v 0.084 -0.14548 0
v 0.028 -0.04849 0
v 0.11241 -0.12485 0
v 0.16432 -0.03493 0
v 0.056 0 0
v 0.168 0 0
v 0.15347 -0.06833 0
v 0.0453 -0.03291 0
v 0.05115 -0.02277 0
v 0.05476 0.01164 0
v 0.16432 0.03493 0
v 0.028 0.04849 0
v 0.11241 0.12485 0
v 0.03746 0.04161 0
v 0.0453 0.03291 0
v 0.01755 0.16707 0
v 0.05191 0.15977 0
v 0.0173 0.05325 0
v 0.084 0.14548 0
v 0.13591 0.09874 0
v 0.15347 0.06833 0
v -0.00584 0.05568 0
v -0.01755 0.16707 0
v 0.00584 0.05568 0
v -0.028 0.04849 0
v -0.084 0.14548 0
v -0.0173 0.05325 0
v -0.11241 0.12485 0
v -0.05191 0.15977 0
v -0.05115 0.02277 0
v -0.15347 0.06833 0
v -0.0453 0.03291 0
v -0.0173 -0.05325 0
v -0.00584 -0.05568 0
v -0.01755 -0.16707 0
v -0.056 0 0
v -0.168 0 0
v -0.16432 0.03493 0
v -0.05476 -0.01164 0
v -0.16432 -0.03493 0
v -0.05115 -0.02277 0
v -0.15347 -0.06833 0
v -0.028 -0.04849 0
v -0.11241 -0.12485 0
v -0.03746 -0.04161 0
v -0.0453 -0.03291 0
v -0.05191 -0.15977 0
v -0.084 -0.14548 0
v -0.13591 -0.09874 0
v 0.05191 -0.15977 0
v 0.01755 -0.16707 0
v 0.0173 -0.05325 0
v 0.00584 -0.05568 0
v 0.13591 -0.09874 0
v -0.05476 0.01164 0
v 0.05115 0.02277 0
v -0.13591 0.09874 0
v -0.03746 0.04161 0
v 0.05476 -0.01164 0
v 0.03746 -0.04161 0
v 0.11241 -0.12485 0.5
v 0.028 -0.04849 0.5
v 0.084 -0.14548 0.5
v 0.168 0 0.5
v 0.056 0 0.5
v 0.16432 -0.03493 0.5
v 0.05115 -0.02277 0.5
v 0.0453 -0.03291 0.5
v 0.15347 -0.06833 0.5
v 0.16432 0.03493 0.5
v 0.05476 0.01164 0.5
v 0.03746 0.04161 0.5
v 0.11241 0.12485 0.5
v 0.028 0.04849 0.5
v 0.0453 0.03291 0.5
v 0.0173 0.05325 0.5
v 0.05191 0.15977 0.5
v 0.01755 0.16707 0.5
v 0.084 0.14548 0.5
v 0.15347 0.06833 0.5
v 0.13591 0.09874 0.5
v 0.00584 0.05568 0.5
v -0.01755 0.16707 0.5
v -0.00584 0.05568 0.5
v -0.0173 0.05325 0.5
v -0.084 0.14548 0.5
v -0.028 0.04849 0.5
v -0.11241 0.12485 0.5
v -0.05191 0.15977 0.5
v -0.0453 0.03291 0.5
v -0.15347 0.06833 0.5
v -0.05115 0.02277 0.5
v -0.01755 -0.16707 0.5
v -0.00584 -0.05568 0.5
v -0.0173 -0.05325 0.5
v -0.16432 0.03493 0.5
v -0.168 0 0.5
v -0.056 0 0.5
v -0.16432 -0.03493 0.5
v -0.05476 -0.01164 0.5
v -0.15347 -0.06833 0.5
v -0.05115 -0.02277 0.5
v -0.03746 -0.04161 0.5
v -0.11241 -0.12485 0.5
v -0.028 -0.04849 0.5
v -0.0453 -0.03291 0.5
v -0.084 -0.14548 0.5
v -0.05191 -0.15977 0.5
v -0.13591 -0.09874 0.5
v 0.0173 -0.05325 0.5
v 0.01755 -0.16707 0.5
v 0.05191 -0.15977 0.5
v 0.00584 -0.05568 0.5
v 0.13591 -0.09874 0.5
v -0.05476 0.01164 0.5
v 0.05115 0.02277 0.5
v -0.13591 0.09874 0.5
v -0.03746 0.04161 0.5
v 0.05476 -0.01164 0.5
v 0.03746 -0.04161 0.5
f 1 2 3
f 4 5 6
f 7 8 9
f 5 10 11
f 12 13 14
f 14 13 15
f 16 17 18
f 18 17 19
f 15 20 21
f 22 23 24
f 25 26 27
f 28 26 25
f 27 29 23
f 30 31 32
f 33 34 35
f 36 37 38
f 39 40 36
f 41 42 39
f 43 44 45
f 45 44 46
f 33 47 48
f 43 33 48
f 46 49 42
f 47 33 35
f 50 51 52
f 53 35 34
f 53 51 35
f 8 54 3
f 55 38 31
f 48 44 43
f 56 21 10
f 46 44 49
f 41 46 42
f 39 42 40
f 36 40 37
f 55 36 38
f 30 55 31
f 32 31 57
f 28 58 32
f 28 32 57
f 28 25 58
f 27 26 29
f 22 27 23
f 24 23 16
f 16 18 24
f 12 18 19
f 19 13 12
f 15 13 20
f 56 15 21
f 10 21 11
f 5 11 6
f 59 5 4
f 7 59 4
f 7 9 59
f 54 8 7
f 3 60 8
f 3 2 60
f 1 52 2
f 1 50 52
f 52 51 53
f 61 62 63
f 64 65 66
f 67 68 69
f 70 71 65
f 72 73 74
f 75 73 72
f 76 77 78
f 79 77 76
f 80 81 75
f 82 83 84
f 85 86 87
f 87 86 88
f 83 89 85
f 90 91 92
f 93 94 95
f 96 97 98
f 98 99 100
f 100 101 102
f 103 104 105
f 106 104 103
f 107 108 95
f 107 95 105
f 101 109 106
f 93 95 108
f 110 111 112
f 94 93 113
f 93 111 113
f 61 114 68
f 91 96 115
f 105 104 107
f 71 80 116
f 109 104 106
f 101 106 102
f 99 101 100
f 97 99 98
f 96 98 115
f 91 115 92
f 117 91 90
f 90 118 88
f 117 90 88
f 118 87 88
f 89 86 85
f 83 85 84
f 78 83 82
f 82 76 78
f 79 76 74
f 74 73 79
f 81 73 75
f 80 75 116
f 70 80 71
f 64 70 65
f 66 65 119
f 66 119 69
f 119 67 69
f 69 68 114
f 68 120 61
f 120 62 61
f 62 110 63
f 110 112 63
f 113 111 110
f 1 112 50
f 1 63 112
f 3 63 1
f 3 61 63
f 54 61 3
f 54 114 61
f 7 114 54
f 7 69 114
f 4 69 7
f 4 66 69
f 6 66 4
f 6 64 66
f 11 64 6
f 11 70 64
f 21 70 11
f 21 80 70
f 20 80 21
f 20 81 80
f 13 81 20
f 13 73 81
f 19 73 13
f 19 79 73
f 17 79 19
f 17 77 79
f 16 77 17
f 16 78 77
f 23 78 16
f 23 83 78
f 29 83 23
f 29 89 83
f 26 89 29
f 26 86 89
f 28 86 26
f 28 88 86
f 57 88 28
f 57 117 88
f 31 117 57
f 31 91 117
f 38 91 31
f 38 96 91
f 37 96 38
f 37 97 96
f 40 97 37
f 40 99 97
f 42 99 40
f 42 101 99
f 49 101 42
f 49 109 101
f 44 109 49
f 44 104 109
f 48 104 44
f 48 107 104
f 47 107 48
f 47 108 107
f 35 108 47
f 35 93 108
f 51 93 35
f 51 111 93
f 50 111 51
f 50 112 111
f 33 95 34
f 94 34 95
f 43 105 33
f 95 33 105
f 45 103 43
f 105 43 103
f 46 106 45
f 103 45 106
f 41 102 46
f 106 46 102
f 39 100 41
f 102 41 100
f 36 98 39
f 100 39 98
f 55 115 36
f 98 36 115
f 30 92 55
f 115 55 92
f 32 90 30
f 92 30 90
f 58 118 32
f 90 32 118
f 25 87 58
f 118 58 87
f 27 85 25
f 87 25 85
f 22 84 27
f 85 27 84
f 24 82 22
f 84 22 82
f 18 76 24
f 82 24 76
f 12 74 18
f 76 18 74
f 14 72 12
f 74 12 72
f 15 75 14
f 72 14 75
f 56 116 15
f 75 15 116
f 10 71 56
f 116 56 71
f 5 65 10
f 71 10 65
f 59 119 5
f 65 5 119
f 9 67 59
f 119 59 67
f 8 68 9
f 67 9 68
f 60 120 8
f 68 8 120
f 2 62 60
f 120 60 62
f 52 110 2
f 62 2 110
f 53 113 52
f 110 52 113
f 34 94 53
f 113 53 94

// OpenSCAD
//===================================================================================
// Parametric PCB Standoff Spacer OpenSCAD script
//
// Copyright (c) 2016 Mark Seminatore
//
// Refer to included LICENSE.txt for usage rights and restrictions
//===================================================================================
//

/* [Build Plate] */
/*
use <utils/build_plate.scad>

//set your build plate
build_plate_selector = 0; //[0:Replicator 2,1: Replicator,2:Thingomatic,3:Manual]

//if set to "manual" set the  build plate x dimension
build_plate_manual_x = 100; //[100:400]

//if set to "manual" set the  build plate y dimension
build_plate_manual_y = 100; //[100:400]

build_plate(build_plate_selector,build_plate_manual_x,build_plate_manual_y);
*/

/* [Spacer] */

// Height of spacer
spacer_height = 0.5;   // [0.25 : 0.125 : 1]

// Standard screw diameter
screw_size = 0.1120;  // [0.112:#4, 0.125:#5, 0.138:#6, 0.164:#8, 0.19:#10, 0.216:#12, 0.25:1/4", 0.375:3/8"]

// Number of spacers
spacer_count = 1;   // [1:25]

// Separation factor
separation_factor = 1.25;   // [1: 0.05: 2]

//
// calculated values
//

// Diameter of spacer
spacer_diameter = screw_size * 3;

// Separation between spacers
separation = spacer_diameter * separation_factor;

/* [Hidden] */

$fs = 0.01;

// instantiate an array of spacer objects
columns = ceil(sqrt(spacer_count));
rows = ceil(spacer_count / columns);

for (row = [1 : rows]) {
    for (col = [1 : columns]) {
        count = (row - 1) * columns + col;

        if (count <= spacer_count) {
            translate([(col - 1) * separation, -(row - 1) * separation, 0])
                mdsSpacer(spacer_height, spacer_diameter, screw_size);
        }
    }
}


//
//
//
module mdsSpacer(height, dia, hole) {
    linear_extrude(height = height)
        difference() {
            circle(d = dia);
            circle(d = hole);
        }
}
